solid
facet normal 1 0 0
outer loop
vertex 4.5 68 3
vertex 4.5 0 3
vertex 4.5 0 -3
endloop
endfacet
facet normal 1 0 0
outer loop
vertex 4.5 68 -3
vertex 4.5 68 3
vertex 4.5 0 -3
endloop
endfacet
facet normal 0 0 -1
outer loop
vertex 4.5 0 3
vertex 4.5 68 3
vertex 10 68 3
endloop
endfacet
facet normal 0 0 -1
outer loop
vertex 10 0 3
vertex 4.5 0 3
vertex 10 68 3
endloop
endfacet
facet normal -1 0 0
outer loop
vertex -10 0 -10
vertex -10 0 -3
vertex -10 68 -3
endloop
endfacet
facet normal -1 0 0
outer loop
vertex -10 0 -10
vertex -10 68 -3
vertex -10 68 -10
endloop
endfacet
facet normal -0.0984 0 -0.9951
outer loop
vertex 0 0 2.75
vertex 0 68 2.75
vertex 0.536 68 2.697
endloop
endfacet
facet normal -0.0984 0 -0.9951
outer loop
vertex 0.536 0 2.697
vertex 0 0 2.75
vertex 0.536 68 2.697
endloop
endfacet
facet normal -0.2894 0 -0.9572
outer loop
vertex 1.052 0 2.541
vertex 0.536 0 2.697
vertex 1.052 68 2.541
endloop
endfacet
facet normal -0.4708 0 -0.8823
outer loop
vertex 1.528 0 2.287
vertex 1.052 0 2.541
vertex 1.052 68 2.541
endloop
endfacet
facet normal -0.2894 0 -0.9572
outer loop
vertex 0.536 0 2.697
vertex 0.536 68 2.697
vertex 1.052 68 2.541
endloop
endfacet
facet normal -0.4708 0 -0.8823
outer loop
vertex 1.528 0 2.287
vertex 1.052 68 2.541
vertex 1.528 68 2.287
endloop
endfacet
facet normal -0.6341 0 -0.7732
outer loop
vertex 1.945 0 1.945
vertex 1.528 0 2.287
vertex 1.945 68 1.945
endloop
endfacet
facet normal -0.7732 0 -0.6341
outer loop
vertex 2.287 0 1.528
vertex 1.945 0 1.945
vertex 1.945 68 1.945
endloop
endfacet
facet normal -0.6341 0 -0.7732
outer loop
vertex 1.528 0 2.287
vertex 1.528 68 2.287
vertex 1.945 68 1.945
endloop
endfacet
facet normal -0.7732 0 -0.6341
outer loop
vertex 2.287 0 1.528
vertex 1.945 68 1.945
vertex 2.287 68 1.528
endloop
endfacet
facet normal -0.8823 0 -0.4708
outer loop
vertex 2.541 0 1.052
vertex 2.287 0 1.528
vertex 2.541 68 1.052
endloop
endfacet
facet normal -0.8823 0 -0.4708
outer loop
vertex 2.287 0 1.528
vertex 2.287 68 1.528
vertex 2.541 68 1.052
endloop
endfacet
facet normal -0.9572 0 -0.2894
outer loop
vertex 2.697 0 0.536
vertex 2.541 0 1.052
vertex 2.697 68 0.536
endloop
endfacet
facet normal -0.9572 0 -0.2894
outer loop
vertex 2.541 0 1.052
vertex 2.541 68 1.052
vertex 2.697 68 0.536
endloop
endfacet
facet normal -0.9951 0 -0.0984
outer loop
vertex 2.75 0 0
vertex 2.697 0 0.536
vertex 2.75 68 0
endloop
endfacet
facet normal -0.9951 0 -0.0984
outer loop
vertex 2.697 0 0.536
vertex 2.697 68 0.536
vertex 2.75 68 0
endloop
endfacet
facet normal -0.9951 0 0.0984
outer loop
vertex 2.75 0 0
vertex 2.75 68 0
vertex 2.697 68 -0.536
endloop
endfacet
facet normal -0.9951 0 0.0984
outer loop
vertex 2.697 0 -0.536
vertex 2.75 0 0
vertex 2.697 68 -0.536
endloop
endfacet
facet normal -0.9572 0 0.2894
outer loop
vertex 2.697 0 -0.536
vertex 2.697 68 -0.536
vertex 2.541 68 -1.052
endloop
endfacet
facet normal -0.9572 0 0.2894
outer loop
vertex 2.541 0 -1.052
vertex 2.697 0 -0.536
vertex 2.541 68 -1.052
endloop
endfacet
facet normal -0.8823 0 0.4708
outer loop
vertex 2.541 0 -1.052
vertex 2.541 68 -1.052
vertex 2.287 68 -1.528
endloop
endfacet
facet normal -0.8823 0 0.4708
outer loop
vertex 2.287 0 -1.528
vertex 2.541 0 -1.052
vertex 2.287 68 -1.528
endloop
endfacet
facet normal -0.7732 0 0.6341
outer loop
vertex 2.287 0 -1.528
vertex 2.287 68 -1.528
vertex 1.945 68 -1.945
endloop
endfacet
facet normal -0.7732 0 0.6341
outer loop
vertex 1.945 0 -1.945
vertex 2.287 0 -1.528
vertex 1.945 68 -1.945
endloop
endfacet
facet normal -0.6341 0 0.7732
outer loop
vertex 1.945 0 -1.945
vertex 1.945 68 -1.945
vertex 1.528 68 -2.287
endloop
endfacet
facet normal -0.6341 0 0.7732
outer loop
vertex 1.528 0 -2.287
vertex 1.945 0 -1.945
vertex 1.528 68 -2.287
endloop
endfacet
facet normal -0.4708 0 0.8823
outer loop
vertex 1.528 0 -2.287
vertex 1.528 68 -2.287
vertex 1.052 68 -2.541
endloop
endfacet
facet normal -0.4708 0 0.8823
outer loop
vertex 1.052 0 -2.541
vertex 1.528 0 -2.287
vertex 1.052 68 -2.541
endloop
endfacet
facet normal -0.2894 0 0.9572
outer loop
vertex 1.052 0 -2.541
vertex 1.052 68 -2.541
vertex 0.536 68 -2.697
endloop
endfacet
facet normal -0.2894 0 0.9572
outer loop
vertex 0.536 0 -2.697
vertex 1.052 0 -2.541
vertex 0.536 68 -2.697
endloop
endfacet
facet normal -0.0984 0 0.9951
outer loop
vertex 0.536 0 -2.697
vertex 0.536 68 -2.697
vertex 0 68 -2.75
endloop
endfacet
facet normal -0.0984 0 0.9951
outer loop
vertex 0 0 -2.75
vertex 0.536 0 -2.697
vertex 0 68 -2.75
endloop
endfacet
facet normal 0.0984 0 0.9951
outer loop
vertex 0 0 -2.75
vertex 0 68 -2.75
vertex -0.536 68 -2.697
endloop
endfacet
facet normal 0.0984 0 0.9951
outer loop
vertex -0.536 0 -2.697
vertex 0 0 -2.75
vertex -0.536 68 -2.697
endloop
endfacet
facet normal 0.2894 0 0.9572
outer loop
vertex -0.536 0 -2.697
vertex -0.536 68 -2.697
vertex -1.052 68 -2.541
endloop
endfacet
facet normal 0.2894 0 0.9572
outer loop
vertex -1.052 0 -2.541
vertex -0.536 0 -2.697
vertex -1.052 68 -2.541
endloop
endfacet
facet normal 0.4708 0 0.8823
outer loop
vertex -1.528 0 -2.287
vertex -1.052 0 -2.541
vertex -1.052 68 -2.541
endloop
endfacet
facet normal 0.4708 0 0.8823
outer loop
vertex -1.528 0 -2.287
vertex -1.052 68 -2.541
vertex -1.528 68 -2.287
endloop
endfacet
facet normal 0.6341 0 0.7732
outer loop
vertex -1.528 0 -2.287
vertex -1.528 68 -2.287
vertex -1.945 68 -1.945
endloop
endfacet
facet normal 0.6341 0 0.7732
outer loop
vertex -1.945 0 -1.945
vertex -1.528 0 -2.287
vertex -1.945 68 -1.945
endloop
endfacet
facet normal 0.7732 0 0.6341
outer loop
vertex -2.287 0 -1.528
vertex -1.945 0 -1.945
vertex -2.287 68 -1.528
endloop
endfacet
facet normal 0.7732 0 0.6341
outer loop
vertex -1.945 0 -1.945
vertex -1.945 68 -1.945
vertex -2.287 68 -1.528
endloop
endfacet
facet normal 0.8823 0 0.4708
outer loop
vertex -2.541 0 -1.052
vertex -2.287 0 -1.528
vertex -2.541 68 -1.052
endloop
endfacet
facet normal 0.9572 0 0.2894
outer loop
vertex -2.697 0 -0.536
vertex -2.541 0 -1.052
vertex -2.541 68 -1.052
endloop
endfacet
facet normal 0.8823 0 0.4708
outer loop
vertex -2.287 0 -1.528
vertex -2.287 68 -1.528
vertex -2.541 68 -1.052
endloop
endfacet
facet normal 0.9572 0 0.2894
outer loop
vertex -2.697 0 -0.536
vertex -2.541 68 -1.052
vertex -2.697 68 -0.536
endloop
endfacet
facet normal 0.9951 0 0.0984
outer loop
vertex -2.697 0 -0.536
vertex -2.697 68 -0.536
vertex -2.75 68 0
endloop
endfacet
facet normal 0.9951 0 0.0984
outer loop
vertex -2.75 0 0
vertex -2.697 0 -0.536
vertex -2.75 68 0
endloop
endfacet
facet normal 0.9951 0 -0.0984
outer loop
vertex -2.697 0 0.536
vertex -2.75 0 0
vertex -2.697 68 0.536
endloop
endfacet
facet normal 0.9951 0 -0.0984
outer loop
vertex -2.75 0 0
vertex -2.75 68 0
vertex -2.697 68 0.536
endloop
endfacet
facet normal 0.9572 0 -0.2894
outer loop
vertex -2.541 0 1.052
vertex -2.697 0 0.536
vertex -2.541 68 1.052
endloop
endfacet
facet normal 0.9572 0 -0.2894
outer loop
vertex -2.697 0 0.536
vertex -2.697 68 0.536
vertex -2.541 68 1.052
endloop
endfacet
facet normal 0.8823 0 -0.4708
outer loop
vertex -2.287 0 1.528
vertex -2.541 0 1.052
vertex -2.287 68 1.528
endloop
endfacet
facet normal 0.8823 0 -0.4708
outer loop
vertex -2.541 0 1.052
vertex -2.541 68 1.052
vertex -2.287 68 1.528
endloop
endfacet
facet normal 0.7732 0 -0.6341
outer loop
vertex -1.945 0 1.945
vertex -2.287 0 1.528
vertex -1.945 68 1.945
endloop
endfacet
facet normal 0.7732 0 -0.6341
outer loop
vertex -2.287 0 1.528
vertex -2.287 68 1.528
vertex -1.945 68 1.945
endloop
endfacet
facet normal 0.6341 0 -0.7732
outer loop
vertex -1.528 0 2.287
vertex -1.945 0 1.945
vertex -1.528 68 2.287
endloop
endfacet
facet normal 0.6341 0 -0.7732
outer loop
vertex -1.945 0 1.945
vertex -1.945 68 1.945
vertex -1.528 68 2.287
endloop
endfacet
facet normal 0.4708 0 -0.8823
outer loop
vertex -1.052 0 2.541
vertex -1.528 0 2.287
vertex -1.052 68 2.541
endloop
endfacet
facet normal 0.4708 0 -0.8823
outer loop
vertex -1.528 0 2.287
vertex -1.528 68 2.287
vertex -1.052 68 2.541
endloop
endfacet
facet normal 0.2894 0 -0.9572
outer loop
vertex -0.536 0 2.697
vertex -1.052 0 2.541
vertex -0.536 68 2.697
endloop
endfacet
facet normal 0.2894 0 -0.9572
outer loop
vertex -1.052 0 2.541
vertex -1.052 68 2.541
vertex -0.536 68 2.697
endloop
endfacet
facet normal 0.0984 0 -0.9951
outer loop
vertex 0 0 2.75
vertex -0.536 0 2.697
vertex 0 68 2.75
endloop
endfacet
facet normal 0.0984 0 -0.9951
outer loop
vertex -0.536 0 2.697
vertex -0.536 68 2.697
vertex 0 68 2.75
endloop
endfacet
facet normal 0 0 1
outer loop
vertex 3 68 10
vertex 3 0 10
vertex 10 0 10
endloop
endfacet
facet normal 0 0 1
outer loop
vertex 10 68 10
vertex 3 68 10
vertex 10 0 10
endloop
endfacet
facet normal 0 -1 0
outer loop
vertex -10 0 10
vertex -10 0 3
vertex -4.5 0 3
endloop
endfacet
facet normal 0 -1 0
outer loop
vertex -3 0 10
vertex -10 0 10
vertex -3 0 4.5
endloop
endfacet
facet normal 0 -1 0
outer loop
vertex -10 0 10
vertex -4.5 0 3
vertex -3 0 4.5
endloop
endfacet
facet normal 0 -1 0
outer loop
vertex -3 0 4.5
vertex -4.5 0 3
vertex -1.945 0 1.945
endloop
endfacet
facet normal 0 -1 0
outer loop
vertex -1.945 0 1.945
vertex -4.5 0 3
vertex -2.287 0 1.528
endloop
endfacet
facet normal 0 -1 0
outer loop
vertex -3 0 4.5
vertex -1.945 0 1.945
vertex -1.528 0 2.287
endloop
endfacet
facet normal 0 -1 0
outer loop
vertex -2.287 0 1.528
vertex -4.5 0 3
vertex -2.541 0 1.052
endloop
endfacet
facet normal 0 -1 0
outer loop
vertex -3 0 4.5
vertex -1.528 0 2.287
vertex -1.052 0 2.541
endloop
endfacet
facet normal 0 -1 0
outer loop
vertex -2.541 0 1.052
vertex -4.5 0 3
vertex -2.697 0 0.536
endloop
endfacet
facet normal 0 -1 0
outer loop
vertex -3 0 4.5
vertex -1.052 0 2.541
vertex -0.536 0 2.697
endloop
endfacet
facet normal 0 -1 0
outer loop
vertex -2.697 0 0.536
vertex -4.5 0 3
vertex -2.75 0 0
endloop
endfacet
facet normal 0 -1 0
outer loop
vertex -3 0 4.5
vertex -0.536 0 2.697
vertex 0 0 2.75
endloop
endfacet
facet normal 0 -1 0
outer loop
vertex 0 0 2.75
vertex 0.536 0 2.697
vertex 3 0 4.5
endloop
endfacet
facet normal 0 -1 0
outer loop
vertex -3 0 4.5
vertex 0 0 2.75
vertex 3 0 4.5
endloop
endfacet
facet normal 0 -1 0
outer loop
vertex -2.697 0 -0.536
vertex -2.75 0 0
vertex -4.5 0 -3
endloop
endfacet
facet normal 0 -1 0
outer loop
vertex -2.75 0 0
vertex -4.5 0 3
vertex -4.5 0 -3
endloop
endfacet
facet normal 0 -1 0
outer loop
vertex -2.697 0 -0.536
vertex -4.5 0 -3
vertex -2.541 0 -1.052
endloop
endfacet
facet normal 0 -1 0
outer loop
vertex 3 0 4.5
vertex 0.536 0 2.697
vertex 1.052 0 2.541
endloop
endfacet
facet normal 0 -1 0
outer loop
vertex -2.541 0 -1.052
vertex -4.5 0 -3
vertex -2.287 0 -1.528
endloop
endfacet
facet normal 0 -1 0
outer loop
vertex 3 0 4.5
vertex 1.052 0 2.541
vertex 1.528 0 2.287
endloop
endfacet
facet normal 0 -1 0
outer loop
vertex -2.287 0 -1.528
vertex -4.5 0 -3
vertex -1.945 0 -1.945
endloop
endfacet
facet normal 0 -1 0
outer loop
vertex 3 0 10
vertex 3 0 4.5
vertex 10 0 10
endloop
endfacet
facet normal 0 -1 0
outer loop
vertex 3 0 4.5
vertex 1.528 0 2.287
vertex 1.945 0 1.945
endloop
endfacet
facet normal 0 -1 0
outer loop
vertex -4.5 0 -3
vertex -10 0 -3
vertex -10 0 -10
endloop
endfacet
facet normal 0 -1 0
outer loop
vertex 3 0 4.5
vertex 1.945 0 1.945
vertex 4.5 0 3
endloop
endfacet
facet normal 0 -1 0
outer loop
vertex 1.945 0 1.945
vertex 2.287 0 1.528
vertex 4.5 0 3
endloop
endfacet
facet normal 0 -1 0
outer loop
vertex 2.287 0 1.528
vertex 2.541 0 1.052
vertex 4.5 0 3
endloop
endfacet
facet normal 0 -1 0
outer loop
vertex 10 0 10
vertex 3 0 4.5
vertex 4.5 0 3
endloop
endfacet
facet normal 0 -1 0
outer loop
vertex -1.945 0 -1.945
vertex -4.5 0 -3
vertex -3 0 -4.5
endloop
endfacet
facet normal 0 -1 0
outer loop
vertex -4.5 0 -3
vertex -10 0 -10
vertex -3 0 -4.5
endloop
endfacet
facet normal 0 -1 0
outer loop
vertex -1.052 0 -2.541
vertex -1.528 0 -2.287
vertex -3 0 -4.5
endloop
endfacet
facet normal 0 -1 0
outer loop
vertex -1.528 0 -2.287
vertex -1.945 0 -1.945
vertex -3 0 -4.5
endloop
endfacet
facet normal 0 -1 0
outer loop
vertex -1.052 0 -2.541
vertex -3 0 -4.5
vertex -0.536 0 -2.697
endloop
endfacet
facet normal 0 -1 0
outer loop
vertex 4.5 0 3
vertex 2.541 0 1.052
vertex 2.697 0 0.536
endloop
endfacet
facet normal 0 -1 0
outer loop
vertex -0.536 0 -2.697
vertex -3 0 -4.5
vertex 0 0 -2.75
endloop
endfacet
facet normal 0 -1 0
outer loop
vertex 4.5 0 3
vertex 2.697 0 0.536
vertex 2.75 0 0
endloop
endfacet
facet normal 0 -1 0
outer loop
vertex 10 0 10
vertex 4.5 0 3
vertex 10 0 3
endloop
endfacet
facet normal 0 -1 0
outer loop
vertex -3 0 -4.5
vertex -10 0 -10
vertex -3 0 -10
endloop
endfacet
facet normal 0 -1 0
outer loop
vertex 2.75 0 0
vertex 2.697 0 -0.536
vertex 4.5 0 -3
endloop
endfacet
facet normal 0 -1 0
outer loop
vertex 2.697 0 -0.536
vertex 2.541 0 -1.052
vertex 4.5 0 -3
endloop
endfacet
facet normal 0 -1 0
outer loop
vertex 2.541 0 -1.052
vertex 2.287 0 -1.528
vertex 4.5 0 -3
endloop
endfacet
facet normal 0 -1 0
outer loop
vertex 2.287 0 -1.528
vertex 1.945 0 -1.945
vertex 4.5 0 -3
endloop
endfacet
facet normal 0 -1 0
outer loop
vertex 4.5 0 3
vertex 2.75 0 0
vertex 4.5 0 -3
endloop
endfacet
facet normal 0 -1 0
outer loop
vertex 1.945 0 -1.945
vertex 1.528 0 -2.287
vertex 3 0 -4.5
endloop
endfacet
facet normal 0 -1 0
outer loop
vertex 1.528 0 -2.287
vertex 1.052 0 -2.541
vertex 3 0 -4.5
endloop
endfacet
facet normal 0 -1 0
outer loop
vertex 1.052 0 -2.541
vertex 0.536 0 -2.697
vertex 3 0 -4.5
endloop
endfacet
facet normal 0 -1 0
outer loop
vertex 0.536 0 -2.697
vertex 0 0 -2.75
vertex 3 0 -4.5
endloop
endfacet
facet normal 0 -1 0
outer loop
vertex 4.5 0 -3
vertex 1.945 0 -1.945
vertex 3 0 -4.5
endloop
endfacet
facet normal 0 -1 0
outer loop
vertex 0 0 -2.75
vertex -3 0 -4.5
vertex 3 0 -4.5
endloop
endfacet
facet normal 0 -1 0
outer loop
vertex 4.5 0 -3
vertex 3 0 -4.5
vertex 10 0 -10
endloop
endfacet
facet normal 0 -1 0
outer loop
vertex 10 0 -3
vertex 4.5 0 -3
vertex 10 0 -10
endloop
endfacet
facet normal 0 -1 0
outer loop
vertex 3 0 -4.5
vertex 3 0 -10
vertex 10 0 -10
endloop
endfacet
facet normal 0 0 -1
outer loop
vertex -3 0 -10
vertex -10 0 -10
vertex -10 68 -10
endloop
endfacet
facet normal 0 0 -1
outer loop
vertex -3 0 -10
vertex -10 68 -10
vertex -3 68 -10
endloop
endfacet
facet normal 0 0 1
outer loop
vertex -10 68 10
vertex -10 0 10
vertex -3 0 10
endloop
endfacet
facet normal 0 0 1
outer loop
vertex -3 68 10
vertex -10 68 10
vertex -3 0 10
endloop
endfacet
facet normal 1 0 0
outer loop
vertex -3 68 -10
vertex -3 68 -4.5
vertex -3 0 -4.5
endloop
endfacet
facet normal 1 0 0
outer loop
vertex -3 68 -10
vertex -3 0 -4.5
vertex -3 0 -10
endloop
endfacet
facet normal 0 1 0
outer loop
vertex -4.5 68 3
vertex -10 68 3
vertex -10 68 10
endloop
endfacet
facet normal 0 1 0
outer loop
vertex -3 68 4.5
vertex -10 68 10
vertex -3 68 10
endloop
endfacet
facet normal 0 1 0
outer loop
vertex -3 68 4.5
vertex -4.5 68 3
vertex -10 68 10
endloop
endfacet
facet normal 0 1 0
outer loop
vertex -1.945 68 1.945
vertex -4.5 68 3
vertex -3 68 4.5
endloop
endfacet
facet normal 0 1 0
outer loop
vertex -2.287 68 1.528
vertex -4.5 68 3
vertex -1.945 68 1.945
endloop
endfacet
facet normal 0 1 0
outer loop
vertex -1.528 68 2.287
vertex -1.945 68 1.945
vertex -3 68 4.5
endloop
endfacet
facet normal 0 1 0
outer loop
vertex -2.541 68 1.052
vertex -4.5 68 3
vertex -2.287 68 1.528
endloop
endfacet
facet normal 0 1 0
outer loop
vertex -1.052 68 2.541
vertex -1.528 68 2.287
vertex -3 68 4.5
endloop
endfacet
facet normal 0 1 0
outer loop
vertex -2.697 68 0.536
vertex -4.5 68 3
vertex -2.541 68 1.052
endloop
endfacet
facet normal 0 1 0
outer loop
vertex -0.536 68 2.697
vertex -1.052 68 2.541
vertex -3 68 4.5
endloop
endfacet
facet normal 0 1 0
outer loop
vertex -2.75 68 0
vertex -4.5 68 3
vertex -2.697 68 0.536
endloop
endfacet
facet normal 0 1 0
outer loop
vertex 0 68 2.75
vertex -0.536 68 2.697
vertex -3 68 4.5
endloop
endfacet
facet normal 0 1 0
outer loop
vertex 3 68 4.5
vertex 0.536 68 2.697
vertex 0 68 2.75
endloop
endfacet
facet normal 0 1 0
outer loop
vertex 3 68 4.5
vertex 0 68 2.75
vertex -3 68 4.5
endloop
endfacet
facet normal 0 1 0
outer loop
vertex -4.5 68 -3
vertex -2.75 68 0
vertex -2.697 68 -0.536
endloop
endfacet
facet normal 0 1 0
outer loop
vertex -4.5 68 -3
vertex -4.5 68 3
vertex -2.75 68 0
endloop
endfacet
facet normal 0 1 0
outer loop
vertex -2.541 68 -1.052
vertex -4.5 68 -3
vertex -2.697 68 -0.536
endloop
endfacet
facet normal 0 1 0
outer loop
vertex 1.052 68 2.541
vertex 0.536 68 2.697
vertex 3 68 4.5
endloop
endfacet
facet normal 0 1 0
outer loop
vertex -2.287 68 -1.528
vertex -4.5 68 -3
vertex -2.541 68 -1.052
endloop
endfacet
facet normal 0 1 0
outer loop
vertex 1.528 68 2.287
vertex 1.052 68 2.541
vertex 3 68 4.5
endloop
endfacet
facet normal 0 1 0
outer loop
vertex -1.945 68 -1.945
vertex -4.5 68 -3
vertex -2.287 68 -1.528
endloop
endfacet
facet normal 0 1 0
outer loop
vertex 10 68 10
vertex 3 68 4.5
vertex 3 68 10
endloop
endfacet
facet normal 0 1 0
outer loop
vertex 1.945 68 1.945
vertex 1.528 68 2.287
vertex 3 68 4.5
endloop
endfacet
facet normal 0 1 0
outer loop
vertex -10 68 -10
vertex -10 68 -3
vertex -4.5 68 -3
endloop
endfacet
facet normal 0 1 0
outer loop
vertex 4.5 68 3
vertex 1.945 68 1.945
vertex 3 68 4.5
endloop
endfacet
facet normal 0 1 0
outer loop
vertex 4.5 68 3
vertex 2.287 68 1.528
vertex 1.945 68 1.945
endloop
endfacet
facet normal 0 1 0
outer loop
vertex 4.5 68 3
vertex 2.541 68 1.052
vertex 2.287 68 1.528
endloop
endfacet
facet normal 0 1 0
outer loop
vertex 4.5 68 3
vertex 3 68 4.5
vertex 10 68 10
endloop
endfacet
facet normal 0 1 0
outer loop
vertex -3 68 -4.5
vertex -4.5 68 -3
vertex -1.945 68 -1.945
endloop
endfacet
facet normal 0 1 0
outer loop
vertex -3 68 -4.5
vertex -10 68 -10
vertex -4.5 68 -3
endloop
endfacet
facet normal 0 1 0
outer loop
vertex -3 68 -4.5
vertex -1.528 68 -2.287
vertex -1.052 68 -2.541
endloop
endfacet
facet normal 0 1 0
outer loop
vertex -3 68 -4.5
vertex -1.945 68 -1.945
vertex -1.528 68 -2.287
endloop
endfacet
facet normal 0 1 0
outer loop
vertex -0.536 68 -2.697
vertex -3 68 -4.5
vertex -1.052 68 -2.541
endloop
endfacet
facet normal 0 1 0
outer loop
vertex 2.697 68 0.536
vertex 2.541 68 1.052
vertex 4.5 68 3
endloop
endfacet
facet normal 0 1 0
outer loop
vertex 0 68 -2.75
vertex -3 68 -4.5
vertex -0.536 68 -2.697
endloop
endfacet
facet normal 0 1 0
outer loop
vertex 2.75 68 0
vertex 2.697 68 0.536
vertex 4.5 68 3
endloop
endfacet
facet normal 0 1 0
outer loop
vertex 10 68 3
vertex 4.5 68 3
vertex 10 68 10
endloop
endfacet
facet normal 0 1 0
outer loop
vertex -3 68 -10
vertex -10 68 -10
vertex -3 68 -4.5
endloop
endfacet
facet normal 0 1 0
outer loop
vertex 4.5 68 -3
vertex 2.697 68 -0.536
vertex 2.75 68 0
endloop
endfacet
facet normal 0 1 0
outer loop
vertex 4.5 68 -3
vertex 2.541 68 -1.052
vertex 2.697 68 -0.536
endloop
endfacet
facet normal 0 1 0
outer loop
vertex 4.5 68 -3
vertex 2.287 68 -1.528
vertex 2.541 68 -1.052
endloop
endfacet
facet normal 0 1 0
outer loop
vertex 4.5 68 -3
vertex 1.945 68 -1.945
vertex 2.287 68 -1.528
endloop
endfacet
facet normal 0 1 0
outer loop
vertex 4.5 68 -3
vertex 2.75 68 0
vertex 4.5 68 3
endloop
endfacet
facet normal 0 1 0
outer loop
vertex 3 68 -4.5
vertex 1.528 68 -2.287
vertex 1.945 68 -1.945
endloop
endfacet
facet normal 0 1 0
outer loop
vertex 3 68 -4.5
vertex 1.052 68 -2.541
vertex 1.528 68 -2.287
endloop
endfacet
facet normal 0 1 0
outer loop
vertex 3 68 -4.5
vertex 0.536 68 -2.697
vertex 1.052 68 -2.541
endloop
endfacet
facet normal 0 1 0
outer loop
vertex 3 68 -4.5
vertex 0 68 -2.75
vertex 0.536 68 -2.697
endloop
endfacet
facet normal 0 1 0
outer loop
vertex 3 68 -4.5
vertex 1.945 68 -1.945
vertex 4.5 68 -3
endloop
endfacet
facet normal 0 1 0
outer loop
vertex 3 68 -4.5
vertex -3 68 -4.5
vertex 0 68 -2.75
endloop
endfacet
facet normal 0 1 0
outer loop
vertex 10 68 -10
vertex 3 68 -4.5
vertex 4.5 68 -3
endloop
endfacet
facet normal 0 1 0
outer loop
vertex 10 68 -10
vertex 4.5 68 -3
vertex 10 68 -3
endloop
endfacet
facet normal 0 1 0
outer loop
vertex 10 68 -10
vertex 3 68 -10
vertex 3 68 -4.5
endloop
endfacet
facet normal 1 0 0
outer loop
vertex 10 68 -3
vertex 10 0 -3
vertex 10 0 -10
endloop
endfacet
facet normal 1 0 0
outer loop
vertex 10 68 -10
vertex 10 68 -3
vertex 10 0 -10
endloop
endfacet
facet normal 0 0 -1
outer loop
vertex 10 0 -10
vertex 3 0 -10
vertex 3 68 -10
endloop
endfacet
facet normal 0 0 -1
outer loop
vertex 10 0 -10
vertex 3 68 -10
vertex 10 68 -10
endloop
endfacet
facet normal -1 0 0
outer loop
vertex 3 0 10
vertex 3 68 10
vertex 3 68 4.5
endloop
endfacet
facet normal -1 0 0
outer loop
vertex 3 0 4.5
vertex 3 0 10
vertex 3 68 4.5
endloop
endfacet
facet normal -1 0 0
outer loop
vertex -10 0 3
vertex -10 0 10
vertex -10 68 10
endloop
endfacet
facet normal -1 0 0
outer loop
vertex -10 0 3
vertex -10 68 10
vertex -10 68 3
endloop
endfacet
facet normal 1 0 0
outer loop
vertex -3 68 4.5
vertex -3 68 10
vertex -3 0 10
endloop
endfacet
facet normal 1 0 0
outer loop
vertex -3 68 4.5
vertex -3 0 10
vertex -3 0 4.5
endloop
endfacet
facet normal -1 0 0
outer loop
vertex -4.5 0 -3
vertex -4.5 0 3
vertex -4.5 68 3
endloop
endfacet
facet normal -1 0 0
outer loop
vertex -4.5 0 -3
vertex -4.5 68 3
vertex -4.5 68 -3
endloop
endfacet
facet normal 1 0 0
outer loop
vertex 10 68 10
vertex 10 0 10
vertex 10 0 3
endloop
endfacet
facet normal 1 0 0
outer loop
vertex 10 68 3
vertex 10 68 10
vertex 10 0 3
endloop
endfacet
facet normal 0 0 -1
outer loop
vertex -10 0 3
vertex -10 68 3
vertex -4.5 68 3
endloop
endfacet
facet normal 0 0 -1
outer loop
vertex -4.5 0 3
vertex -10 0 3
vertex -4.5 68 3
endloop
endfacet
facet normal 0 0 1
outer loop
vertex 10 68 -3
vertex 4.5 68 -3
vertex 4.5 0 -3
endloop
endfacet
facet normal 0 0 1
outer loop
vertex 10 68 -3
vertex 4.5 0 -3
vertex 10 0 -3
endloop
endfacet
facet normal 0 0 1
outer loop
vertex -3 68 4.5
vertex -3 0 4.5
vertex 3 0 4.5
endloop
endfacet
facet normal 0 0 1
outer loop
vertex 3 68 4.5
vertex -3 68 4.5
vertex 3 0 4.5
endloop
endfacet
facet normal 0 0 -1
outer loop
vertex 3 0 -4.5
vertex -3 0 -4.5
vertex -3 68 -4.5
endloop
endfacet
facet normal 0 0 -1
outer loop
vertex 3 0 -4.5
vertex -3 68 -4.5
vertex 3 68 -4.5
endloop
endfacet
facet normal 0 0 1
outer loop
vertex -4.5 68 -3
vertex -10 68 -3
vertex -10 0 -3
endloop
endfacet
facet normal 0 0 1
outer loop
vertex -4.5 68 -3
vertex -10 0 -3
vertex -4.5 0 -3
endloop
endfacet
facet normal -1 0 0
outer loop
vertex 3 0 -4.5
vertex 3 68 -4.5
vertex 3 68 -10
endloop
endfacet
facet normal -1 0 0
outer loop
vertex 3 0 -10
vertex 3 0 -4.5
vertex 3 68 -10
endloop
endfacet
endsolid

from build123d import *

# Parameters (mm, degrees)
SKETCH1_W    = 20
SKETCH1_H    = 20
BODY_DEPTH   = 68
SKETCH2_R    = 2.75
SKETCH2_W    = 6
SKETCH2_H    = 5.5
SKETCH2_W_2  = 5.5
SKETCH2_H_2  = 6
PROFIL_DEPTH = 70.455021417


with BuildPart() as part:
    # Sketch1 → Body (new body)
    with BuildSketch(Plane(origin=(0, 0, 0), x_dir=(1, 0, 0), z_dir=(0, 1, 0))):
        Rectangle(SKETCH1_W, SKETCH1_H)
    extrude(amount=BODY_DEPTH)

    # Sketch2 → Profil (cut, through all)
    with BuildSketch(Plane(origin=(0, 68, 0), x_dir=(1, 0, 0), z_dir=(0, 1, 0))):
        with Locations(Location((0, 0, 0), (0, 0, 270))):
            Circle(SKETCH2_R)
        with Locations((0, 7.25)):
            Rectangle(SKETCH2_W, SKETCH2_H)
        with Locations((7.25, 0)):
            Rectangle(SKETCH2_W_2, SKETCH2_H_2)
        with Locations((0, -7.25)):
            Rectangle(SKETCH2_W, SKETCH2_H)
        with Locations((-7.25, 0)):
            Rectangle(SKETCH2_W_2, SKETCH2_H_2)
    extrude(amount=-PROFIL_DEPTH, mode=Mode.SUBTRACT)


solid = part.part
